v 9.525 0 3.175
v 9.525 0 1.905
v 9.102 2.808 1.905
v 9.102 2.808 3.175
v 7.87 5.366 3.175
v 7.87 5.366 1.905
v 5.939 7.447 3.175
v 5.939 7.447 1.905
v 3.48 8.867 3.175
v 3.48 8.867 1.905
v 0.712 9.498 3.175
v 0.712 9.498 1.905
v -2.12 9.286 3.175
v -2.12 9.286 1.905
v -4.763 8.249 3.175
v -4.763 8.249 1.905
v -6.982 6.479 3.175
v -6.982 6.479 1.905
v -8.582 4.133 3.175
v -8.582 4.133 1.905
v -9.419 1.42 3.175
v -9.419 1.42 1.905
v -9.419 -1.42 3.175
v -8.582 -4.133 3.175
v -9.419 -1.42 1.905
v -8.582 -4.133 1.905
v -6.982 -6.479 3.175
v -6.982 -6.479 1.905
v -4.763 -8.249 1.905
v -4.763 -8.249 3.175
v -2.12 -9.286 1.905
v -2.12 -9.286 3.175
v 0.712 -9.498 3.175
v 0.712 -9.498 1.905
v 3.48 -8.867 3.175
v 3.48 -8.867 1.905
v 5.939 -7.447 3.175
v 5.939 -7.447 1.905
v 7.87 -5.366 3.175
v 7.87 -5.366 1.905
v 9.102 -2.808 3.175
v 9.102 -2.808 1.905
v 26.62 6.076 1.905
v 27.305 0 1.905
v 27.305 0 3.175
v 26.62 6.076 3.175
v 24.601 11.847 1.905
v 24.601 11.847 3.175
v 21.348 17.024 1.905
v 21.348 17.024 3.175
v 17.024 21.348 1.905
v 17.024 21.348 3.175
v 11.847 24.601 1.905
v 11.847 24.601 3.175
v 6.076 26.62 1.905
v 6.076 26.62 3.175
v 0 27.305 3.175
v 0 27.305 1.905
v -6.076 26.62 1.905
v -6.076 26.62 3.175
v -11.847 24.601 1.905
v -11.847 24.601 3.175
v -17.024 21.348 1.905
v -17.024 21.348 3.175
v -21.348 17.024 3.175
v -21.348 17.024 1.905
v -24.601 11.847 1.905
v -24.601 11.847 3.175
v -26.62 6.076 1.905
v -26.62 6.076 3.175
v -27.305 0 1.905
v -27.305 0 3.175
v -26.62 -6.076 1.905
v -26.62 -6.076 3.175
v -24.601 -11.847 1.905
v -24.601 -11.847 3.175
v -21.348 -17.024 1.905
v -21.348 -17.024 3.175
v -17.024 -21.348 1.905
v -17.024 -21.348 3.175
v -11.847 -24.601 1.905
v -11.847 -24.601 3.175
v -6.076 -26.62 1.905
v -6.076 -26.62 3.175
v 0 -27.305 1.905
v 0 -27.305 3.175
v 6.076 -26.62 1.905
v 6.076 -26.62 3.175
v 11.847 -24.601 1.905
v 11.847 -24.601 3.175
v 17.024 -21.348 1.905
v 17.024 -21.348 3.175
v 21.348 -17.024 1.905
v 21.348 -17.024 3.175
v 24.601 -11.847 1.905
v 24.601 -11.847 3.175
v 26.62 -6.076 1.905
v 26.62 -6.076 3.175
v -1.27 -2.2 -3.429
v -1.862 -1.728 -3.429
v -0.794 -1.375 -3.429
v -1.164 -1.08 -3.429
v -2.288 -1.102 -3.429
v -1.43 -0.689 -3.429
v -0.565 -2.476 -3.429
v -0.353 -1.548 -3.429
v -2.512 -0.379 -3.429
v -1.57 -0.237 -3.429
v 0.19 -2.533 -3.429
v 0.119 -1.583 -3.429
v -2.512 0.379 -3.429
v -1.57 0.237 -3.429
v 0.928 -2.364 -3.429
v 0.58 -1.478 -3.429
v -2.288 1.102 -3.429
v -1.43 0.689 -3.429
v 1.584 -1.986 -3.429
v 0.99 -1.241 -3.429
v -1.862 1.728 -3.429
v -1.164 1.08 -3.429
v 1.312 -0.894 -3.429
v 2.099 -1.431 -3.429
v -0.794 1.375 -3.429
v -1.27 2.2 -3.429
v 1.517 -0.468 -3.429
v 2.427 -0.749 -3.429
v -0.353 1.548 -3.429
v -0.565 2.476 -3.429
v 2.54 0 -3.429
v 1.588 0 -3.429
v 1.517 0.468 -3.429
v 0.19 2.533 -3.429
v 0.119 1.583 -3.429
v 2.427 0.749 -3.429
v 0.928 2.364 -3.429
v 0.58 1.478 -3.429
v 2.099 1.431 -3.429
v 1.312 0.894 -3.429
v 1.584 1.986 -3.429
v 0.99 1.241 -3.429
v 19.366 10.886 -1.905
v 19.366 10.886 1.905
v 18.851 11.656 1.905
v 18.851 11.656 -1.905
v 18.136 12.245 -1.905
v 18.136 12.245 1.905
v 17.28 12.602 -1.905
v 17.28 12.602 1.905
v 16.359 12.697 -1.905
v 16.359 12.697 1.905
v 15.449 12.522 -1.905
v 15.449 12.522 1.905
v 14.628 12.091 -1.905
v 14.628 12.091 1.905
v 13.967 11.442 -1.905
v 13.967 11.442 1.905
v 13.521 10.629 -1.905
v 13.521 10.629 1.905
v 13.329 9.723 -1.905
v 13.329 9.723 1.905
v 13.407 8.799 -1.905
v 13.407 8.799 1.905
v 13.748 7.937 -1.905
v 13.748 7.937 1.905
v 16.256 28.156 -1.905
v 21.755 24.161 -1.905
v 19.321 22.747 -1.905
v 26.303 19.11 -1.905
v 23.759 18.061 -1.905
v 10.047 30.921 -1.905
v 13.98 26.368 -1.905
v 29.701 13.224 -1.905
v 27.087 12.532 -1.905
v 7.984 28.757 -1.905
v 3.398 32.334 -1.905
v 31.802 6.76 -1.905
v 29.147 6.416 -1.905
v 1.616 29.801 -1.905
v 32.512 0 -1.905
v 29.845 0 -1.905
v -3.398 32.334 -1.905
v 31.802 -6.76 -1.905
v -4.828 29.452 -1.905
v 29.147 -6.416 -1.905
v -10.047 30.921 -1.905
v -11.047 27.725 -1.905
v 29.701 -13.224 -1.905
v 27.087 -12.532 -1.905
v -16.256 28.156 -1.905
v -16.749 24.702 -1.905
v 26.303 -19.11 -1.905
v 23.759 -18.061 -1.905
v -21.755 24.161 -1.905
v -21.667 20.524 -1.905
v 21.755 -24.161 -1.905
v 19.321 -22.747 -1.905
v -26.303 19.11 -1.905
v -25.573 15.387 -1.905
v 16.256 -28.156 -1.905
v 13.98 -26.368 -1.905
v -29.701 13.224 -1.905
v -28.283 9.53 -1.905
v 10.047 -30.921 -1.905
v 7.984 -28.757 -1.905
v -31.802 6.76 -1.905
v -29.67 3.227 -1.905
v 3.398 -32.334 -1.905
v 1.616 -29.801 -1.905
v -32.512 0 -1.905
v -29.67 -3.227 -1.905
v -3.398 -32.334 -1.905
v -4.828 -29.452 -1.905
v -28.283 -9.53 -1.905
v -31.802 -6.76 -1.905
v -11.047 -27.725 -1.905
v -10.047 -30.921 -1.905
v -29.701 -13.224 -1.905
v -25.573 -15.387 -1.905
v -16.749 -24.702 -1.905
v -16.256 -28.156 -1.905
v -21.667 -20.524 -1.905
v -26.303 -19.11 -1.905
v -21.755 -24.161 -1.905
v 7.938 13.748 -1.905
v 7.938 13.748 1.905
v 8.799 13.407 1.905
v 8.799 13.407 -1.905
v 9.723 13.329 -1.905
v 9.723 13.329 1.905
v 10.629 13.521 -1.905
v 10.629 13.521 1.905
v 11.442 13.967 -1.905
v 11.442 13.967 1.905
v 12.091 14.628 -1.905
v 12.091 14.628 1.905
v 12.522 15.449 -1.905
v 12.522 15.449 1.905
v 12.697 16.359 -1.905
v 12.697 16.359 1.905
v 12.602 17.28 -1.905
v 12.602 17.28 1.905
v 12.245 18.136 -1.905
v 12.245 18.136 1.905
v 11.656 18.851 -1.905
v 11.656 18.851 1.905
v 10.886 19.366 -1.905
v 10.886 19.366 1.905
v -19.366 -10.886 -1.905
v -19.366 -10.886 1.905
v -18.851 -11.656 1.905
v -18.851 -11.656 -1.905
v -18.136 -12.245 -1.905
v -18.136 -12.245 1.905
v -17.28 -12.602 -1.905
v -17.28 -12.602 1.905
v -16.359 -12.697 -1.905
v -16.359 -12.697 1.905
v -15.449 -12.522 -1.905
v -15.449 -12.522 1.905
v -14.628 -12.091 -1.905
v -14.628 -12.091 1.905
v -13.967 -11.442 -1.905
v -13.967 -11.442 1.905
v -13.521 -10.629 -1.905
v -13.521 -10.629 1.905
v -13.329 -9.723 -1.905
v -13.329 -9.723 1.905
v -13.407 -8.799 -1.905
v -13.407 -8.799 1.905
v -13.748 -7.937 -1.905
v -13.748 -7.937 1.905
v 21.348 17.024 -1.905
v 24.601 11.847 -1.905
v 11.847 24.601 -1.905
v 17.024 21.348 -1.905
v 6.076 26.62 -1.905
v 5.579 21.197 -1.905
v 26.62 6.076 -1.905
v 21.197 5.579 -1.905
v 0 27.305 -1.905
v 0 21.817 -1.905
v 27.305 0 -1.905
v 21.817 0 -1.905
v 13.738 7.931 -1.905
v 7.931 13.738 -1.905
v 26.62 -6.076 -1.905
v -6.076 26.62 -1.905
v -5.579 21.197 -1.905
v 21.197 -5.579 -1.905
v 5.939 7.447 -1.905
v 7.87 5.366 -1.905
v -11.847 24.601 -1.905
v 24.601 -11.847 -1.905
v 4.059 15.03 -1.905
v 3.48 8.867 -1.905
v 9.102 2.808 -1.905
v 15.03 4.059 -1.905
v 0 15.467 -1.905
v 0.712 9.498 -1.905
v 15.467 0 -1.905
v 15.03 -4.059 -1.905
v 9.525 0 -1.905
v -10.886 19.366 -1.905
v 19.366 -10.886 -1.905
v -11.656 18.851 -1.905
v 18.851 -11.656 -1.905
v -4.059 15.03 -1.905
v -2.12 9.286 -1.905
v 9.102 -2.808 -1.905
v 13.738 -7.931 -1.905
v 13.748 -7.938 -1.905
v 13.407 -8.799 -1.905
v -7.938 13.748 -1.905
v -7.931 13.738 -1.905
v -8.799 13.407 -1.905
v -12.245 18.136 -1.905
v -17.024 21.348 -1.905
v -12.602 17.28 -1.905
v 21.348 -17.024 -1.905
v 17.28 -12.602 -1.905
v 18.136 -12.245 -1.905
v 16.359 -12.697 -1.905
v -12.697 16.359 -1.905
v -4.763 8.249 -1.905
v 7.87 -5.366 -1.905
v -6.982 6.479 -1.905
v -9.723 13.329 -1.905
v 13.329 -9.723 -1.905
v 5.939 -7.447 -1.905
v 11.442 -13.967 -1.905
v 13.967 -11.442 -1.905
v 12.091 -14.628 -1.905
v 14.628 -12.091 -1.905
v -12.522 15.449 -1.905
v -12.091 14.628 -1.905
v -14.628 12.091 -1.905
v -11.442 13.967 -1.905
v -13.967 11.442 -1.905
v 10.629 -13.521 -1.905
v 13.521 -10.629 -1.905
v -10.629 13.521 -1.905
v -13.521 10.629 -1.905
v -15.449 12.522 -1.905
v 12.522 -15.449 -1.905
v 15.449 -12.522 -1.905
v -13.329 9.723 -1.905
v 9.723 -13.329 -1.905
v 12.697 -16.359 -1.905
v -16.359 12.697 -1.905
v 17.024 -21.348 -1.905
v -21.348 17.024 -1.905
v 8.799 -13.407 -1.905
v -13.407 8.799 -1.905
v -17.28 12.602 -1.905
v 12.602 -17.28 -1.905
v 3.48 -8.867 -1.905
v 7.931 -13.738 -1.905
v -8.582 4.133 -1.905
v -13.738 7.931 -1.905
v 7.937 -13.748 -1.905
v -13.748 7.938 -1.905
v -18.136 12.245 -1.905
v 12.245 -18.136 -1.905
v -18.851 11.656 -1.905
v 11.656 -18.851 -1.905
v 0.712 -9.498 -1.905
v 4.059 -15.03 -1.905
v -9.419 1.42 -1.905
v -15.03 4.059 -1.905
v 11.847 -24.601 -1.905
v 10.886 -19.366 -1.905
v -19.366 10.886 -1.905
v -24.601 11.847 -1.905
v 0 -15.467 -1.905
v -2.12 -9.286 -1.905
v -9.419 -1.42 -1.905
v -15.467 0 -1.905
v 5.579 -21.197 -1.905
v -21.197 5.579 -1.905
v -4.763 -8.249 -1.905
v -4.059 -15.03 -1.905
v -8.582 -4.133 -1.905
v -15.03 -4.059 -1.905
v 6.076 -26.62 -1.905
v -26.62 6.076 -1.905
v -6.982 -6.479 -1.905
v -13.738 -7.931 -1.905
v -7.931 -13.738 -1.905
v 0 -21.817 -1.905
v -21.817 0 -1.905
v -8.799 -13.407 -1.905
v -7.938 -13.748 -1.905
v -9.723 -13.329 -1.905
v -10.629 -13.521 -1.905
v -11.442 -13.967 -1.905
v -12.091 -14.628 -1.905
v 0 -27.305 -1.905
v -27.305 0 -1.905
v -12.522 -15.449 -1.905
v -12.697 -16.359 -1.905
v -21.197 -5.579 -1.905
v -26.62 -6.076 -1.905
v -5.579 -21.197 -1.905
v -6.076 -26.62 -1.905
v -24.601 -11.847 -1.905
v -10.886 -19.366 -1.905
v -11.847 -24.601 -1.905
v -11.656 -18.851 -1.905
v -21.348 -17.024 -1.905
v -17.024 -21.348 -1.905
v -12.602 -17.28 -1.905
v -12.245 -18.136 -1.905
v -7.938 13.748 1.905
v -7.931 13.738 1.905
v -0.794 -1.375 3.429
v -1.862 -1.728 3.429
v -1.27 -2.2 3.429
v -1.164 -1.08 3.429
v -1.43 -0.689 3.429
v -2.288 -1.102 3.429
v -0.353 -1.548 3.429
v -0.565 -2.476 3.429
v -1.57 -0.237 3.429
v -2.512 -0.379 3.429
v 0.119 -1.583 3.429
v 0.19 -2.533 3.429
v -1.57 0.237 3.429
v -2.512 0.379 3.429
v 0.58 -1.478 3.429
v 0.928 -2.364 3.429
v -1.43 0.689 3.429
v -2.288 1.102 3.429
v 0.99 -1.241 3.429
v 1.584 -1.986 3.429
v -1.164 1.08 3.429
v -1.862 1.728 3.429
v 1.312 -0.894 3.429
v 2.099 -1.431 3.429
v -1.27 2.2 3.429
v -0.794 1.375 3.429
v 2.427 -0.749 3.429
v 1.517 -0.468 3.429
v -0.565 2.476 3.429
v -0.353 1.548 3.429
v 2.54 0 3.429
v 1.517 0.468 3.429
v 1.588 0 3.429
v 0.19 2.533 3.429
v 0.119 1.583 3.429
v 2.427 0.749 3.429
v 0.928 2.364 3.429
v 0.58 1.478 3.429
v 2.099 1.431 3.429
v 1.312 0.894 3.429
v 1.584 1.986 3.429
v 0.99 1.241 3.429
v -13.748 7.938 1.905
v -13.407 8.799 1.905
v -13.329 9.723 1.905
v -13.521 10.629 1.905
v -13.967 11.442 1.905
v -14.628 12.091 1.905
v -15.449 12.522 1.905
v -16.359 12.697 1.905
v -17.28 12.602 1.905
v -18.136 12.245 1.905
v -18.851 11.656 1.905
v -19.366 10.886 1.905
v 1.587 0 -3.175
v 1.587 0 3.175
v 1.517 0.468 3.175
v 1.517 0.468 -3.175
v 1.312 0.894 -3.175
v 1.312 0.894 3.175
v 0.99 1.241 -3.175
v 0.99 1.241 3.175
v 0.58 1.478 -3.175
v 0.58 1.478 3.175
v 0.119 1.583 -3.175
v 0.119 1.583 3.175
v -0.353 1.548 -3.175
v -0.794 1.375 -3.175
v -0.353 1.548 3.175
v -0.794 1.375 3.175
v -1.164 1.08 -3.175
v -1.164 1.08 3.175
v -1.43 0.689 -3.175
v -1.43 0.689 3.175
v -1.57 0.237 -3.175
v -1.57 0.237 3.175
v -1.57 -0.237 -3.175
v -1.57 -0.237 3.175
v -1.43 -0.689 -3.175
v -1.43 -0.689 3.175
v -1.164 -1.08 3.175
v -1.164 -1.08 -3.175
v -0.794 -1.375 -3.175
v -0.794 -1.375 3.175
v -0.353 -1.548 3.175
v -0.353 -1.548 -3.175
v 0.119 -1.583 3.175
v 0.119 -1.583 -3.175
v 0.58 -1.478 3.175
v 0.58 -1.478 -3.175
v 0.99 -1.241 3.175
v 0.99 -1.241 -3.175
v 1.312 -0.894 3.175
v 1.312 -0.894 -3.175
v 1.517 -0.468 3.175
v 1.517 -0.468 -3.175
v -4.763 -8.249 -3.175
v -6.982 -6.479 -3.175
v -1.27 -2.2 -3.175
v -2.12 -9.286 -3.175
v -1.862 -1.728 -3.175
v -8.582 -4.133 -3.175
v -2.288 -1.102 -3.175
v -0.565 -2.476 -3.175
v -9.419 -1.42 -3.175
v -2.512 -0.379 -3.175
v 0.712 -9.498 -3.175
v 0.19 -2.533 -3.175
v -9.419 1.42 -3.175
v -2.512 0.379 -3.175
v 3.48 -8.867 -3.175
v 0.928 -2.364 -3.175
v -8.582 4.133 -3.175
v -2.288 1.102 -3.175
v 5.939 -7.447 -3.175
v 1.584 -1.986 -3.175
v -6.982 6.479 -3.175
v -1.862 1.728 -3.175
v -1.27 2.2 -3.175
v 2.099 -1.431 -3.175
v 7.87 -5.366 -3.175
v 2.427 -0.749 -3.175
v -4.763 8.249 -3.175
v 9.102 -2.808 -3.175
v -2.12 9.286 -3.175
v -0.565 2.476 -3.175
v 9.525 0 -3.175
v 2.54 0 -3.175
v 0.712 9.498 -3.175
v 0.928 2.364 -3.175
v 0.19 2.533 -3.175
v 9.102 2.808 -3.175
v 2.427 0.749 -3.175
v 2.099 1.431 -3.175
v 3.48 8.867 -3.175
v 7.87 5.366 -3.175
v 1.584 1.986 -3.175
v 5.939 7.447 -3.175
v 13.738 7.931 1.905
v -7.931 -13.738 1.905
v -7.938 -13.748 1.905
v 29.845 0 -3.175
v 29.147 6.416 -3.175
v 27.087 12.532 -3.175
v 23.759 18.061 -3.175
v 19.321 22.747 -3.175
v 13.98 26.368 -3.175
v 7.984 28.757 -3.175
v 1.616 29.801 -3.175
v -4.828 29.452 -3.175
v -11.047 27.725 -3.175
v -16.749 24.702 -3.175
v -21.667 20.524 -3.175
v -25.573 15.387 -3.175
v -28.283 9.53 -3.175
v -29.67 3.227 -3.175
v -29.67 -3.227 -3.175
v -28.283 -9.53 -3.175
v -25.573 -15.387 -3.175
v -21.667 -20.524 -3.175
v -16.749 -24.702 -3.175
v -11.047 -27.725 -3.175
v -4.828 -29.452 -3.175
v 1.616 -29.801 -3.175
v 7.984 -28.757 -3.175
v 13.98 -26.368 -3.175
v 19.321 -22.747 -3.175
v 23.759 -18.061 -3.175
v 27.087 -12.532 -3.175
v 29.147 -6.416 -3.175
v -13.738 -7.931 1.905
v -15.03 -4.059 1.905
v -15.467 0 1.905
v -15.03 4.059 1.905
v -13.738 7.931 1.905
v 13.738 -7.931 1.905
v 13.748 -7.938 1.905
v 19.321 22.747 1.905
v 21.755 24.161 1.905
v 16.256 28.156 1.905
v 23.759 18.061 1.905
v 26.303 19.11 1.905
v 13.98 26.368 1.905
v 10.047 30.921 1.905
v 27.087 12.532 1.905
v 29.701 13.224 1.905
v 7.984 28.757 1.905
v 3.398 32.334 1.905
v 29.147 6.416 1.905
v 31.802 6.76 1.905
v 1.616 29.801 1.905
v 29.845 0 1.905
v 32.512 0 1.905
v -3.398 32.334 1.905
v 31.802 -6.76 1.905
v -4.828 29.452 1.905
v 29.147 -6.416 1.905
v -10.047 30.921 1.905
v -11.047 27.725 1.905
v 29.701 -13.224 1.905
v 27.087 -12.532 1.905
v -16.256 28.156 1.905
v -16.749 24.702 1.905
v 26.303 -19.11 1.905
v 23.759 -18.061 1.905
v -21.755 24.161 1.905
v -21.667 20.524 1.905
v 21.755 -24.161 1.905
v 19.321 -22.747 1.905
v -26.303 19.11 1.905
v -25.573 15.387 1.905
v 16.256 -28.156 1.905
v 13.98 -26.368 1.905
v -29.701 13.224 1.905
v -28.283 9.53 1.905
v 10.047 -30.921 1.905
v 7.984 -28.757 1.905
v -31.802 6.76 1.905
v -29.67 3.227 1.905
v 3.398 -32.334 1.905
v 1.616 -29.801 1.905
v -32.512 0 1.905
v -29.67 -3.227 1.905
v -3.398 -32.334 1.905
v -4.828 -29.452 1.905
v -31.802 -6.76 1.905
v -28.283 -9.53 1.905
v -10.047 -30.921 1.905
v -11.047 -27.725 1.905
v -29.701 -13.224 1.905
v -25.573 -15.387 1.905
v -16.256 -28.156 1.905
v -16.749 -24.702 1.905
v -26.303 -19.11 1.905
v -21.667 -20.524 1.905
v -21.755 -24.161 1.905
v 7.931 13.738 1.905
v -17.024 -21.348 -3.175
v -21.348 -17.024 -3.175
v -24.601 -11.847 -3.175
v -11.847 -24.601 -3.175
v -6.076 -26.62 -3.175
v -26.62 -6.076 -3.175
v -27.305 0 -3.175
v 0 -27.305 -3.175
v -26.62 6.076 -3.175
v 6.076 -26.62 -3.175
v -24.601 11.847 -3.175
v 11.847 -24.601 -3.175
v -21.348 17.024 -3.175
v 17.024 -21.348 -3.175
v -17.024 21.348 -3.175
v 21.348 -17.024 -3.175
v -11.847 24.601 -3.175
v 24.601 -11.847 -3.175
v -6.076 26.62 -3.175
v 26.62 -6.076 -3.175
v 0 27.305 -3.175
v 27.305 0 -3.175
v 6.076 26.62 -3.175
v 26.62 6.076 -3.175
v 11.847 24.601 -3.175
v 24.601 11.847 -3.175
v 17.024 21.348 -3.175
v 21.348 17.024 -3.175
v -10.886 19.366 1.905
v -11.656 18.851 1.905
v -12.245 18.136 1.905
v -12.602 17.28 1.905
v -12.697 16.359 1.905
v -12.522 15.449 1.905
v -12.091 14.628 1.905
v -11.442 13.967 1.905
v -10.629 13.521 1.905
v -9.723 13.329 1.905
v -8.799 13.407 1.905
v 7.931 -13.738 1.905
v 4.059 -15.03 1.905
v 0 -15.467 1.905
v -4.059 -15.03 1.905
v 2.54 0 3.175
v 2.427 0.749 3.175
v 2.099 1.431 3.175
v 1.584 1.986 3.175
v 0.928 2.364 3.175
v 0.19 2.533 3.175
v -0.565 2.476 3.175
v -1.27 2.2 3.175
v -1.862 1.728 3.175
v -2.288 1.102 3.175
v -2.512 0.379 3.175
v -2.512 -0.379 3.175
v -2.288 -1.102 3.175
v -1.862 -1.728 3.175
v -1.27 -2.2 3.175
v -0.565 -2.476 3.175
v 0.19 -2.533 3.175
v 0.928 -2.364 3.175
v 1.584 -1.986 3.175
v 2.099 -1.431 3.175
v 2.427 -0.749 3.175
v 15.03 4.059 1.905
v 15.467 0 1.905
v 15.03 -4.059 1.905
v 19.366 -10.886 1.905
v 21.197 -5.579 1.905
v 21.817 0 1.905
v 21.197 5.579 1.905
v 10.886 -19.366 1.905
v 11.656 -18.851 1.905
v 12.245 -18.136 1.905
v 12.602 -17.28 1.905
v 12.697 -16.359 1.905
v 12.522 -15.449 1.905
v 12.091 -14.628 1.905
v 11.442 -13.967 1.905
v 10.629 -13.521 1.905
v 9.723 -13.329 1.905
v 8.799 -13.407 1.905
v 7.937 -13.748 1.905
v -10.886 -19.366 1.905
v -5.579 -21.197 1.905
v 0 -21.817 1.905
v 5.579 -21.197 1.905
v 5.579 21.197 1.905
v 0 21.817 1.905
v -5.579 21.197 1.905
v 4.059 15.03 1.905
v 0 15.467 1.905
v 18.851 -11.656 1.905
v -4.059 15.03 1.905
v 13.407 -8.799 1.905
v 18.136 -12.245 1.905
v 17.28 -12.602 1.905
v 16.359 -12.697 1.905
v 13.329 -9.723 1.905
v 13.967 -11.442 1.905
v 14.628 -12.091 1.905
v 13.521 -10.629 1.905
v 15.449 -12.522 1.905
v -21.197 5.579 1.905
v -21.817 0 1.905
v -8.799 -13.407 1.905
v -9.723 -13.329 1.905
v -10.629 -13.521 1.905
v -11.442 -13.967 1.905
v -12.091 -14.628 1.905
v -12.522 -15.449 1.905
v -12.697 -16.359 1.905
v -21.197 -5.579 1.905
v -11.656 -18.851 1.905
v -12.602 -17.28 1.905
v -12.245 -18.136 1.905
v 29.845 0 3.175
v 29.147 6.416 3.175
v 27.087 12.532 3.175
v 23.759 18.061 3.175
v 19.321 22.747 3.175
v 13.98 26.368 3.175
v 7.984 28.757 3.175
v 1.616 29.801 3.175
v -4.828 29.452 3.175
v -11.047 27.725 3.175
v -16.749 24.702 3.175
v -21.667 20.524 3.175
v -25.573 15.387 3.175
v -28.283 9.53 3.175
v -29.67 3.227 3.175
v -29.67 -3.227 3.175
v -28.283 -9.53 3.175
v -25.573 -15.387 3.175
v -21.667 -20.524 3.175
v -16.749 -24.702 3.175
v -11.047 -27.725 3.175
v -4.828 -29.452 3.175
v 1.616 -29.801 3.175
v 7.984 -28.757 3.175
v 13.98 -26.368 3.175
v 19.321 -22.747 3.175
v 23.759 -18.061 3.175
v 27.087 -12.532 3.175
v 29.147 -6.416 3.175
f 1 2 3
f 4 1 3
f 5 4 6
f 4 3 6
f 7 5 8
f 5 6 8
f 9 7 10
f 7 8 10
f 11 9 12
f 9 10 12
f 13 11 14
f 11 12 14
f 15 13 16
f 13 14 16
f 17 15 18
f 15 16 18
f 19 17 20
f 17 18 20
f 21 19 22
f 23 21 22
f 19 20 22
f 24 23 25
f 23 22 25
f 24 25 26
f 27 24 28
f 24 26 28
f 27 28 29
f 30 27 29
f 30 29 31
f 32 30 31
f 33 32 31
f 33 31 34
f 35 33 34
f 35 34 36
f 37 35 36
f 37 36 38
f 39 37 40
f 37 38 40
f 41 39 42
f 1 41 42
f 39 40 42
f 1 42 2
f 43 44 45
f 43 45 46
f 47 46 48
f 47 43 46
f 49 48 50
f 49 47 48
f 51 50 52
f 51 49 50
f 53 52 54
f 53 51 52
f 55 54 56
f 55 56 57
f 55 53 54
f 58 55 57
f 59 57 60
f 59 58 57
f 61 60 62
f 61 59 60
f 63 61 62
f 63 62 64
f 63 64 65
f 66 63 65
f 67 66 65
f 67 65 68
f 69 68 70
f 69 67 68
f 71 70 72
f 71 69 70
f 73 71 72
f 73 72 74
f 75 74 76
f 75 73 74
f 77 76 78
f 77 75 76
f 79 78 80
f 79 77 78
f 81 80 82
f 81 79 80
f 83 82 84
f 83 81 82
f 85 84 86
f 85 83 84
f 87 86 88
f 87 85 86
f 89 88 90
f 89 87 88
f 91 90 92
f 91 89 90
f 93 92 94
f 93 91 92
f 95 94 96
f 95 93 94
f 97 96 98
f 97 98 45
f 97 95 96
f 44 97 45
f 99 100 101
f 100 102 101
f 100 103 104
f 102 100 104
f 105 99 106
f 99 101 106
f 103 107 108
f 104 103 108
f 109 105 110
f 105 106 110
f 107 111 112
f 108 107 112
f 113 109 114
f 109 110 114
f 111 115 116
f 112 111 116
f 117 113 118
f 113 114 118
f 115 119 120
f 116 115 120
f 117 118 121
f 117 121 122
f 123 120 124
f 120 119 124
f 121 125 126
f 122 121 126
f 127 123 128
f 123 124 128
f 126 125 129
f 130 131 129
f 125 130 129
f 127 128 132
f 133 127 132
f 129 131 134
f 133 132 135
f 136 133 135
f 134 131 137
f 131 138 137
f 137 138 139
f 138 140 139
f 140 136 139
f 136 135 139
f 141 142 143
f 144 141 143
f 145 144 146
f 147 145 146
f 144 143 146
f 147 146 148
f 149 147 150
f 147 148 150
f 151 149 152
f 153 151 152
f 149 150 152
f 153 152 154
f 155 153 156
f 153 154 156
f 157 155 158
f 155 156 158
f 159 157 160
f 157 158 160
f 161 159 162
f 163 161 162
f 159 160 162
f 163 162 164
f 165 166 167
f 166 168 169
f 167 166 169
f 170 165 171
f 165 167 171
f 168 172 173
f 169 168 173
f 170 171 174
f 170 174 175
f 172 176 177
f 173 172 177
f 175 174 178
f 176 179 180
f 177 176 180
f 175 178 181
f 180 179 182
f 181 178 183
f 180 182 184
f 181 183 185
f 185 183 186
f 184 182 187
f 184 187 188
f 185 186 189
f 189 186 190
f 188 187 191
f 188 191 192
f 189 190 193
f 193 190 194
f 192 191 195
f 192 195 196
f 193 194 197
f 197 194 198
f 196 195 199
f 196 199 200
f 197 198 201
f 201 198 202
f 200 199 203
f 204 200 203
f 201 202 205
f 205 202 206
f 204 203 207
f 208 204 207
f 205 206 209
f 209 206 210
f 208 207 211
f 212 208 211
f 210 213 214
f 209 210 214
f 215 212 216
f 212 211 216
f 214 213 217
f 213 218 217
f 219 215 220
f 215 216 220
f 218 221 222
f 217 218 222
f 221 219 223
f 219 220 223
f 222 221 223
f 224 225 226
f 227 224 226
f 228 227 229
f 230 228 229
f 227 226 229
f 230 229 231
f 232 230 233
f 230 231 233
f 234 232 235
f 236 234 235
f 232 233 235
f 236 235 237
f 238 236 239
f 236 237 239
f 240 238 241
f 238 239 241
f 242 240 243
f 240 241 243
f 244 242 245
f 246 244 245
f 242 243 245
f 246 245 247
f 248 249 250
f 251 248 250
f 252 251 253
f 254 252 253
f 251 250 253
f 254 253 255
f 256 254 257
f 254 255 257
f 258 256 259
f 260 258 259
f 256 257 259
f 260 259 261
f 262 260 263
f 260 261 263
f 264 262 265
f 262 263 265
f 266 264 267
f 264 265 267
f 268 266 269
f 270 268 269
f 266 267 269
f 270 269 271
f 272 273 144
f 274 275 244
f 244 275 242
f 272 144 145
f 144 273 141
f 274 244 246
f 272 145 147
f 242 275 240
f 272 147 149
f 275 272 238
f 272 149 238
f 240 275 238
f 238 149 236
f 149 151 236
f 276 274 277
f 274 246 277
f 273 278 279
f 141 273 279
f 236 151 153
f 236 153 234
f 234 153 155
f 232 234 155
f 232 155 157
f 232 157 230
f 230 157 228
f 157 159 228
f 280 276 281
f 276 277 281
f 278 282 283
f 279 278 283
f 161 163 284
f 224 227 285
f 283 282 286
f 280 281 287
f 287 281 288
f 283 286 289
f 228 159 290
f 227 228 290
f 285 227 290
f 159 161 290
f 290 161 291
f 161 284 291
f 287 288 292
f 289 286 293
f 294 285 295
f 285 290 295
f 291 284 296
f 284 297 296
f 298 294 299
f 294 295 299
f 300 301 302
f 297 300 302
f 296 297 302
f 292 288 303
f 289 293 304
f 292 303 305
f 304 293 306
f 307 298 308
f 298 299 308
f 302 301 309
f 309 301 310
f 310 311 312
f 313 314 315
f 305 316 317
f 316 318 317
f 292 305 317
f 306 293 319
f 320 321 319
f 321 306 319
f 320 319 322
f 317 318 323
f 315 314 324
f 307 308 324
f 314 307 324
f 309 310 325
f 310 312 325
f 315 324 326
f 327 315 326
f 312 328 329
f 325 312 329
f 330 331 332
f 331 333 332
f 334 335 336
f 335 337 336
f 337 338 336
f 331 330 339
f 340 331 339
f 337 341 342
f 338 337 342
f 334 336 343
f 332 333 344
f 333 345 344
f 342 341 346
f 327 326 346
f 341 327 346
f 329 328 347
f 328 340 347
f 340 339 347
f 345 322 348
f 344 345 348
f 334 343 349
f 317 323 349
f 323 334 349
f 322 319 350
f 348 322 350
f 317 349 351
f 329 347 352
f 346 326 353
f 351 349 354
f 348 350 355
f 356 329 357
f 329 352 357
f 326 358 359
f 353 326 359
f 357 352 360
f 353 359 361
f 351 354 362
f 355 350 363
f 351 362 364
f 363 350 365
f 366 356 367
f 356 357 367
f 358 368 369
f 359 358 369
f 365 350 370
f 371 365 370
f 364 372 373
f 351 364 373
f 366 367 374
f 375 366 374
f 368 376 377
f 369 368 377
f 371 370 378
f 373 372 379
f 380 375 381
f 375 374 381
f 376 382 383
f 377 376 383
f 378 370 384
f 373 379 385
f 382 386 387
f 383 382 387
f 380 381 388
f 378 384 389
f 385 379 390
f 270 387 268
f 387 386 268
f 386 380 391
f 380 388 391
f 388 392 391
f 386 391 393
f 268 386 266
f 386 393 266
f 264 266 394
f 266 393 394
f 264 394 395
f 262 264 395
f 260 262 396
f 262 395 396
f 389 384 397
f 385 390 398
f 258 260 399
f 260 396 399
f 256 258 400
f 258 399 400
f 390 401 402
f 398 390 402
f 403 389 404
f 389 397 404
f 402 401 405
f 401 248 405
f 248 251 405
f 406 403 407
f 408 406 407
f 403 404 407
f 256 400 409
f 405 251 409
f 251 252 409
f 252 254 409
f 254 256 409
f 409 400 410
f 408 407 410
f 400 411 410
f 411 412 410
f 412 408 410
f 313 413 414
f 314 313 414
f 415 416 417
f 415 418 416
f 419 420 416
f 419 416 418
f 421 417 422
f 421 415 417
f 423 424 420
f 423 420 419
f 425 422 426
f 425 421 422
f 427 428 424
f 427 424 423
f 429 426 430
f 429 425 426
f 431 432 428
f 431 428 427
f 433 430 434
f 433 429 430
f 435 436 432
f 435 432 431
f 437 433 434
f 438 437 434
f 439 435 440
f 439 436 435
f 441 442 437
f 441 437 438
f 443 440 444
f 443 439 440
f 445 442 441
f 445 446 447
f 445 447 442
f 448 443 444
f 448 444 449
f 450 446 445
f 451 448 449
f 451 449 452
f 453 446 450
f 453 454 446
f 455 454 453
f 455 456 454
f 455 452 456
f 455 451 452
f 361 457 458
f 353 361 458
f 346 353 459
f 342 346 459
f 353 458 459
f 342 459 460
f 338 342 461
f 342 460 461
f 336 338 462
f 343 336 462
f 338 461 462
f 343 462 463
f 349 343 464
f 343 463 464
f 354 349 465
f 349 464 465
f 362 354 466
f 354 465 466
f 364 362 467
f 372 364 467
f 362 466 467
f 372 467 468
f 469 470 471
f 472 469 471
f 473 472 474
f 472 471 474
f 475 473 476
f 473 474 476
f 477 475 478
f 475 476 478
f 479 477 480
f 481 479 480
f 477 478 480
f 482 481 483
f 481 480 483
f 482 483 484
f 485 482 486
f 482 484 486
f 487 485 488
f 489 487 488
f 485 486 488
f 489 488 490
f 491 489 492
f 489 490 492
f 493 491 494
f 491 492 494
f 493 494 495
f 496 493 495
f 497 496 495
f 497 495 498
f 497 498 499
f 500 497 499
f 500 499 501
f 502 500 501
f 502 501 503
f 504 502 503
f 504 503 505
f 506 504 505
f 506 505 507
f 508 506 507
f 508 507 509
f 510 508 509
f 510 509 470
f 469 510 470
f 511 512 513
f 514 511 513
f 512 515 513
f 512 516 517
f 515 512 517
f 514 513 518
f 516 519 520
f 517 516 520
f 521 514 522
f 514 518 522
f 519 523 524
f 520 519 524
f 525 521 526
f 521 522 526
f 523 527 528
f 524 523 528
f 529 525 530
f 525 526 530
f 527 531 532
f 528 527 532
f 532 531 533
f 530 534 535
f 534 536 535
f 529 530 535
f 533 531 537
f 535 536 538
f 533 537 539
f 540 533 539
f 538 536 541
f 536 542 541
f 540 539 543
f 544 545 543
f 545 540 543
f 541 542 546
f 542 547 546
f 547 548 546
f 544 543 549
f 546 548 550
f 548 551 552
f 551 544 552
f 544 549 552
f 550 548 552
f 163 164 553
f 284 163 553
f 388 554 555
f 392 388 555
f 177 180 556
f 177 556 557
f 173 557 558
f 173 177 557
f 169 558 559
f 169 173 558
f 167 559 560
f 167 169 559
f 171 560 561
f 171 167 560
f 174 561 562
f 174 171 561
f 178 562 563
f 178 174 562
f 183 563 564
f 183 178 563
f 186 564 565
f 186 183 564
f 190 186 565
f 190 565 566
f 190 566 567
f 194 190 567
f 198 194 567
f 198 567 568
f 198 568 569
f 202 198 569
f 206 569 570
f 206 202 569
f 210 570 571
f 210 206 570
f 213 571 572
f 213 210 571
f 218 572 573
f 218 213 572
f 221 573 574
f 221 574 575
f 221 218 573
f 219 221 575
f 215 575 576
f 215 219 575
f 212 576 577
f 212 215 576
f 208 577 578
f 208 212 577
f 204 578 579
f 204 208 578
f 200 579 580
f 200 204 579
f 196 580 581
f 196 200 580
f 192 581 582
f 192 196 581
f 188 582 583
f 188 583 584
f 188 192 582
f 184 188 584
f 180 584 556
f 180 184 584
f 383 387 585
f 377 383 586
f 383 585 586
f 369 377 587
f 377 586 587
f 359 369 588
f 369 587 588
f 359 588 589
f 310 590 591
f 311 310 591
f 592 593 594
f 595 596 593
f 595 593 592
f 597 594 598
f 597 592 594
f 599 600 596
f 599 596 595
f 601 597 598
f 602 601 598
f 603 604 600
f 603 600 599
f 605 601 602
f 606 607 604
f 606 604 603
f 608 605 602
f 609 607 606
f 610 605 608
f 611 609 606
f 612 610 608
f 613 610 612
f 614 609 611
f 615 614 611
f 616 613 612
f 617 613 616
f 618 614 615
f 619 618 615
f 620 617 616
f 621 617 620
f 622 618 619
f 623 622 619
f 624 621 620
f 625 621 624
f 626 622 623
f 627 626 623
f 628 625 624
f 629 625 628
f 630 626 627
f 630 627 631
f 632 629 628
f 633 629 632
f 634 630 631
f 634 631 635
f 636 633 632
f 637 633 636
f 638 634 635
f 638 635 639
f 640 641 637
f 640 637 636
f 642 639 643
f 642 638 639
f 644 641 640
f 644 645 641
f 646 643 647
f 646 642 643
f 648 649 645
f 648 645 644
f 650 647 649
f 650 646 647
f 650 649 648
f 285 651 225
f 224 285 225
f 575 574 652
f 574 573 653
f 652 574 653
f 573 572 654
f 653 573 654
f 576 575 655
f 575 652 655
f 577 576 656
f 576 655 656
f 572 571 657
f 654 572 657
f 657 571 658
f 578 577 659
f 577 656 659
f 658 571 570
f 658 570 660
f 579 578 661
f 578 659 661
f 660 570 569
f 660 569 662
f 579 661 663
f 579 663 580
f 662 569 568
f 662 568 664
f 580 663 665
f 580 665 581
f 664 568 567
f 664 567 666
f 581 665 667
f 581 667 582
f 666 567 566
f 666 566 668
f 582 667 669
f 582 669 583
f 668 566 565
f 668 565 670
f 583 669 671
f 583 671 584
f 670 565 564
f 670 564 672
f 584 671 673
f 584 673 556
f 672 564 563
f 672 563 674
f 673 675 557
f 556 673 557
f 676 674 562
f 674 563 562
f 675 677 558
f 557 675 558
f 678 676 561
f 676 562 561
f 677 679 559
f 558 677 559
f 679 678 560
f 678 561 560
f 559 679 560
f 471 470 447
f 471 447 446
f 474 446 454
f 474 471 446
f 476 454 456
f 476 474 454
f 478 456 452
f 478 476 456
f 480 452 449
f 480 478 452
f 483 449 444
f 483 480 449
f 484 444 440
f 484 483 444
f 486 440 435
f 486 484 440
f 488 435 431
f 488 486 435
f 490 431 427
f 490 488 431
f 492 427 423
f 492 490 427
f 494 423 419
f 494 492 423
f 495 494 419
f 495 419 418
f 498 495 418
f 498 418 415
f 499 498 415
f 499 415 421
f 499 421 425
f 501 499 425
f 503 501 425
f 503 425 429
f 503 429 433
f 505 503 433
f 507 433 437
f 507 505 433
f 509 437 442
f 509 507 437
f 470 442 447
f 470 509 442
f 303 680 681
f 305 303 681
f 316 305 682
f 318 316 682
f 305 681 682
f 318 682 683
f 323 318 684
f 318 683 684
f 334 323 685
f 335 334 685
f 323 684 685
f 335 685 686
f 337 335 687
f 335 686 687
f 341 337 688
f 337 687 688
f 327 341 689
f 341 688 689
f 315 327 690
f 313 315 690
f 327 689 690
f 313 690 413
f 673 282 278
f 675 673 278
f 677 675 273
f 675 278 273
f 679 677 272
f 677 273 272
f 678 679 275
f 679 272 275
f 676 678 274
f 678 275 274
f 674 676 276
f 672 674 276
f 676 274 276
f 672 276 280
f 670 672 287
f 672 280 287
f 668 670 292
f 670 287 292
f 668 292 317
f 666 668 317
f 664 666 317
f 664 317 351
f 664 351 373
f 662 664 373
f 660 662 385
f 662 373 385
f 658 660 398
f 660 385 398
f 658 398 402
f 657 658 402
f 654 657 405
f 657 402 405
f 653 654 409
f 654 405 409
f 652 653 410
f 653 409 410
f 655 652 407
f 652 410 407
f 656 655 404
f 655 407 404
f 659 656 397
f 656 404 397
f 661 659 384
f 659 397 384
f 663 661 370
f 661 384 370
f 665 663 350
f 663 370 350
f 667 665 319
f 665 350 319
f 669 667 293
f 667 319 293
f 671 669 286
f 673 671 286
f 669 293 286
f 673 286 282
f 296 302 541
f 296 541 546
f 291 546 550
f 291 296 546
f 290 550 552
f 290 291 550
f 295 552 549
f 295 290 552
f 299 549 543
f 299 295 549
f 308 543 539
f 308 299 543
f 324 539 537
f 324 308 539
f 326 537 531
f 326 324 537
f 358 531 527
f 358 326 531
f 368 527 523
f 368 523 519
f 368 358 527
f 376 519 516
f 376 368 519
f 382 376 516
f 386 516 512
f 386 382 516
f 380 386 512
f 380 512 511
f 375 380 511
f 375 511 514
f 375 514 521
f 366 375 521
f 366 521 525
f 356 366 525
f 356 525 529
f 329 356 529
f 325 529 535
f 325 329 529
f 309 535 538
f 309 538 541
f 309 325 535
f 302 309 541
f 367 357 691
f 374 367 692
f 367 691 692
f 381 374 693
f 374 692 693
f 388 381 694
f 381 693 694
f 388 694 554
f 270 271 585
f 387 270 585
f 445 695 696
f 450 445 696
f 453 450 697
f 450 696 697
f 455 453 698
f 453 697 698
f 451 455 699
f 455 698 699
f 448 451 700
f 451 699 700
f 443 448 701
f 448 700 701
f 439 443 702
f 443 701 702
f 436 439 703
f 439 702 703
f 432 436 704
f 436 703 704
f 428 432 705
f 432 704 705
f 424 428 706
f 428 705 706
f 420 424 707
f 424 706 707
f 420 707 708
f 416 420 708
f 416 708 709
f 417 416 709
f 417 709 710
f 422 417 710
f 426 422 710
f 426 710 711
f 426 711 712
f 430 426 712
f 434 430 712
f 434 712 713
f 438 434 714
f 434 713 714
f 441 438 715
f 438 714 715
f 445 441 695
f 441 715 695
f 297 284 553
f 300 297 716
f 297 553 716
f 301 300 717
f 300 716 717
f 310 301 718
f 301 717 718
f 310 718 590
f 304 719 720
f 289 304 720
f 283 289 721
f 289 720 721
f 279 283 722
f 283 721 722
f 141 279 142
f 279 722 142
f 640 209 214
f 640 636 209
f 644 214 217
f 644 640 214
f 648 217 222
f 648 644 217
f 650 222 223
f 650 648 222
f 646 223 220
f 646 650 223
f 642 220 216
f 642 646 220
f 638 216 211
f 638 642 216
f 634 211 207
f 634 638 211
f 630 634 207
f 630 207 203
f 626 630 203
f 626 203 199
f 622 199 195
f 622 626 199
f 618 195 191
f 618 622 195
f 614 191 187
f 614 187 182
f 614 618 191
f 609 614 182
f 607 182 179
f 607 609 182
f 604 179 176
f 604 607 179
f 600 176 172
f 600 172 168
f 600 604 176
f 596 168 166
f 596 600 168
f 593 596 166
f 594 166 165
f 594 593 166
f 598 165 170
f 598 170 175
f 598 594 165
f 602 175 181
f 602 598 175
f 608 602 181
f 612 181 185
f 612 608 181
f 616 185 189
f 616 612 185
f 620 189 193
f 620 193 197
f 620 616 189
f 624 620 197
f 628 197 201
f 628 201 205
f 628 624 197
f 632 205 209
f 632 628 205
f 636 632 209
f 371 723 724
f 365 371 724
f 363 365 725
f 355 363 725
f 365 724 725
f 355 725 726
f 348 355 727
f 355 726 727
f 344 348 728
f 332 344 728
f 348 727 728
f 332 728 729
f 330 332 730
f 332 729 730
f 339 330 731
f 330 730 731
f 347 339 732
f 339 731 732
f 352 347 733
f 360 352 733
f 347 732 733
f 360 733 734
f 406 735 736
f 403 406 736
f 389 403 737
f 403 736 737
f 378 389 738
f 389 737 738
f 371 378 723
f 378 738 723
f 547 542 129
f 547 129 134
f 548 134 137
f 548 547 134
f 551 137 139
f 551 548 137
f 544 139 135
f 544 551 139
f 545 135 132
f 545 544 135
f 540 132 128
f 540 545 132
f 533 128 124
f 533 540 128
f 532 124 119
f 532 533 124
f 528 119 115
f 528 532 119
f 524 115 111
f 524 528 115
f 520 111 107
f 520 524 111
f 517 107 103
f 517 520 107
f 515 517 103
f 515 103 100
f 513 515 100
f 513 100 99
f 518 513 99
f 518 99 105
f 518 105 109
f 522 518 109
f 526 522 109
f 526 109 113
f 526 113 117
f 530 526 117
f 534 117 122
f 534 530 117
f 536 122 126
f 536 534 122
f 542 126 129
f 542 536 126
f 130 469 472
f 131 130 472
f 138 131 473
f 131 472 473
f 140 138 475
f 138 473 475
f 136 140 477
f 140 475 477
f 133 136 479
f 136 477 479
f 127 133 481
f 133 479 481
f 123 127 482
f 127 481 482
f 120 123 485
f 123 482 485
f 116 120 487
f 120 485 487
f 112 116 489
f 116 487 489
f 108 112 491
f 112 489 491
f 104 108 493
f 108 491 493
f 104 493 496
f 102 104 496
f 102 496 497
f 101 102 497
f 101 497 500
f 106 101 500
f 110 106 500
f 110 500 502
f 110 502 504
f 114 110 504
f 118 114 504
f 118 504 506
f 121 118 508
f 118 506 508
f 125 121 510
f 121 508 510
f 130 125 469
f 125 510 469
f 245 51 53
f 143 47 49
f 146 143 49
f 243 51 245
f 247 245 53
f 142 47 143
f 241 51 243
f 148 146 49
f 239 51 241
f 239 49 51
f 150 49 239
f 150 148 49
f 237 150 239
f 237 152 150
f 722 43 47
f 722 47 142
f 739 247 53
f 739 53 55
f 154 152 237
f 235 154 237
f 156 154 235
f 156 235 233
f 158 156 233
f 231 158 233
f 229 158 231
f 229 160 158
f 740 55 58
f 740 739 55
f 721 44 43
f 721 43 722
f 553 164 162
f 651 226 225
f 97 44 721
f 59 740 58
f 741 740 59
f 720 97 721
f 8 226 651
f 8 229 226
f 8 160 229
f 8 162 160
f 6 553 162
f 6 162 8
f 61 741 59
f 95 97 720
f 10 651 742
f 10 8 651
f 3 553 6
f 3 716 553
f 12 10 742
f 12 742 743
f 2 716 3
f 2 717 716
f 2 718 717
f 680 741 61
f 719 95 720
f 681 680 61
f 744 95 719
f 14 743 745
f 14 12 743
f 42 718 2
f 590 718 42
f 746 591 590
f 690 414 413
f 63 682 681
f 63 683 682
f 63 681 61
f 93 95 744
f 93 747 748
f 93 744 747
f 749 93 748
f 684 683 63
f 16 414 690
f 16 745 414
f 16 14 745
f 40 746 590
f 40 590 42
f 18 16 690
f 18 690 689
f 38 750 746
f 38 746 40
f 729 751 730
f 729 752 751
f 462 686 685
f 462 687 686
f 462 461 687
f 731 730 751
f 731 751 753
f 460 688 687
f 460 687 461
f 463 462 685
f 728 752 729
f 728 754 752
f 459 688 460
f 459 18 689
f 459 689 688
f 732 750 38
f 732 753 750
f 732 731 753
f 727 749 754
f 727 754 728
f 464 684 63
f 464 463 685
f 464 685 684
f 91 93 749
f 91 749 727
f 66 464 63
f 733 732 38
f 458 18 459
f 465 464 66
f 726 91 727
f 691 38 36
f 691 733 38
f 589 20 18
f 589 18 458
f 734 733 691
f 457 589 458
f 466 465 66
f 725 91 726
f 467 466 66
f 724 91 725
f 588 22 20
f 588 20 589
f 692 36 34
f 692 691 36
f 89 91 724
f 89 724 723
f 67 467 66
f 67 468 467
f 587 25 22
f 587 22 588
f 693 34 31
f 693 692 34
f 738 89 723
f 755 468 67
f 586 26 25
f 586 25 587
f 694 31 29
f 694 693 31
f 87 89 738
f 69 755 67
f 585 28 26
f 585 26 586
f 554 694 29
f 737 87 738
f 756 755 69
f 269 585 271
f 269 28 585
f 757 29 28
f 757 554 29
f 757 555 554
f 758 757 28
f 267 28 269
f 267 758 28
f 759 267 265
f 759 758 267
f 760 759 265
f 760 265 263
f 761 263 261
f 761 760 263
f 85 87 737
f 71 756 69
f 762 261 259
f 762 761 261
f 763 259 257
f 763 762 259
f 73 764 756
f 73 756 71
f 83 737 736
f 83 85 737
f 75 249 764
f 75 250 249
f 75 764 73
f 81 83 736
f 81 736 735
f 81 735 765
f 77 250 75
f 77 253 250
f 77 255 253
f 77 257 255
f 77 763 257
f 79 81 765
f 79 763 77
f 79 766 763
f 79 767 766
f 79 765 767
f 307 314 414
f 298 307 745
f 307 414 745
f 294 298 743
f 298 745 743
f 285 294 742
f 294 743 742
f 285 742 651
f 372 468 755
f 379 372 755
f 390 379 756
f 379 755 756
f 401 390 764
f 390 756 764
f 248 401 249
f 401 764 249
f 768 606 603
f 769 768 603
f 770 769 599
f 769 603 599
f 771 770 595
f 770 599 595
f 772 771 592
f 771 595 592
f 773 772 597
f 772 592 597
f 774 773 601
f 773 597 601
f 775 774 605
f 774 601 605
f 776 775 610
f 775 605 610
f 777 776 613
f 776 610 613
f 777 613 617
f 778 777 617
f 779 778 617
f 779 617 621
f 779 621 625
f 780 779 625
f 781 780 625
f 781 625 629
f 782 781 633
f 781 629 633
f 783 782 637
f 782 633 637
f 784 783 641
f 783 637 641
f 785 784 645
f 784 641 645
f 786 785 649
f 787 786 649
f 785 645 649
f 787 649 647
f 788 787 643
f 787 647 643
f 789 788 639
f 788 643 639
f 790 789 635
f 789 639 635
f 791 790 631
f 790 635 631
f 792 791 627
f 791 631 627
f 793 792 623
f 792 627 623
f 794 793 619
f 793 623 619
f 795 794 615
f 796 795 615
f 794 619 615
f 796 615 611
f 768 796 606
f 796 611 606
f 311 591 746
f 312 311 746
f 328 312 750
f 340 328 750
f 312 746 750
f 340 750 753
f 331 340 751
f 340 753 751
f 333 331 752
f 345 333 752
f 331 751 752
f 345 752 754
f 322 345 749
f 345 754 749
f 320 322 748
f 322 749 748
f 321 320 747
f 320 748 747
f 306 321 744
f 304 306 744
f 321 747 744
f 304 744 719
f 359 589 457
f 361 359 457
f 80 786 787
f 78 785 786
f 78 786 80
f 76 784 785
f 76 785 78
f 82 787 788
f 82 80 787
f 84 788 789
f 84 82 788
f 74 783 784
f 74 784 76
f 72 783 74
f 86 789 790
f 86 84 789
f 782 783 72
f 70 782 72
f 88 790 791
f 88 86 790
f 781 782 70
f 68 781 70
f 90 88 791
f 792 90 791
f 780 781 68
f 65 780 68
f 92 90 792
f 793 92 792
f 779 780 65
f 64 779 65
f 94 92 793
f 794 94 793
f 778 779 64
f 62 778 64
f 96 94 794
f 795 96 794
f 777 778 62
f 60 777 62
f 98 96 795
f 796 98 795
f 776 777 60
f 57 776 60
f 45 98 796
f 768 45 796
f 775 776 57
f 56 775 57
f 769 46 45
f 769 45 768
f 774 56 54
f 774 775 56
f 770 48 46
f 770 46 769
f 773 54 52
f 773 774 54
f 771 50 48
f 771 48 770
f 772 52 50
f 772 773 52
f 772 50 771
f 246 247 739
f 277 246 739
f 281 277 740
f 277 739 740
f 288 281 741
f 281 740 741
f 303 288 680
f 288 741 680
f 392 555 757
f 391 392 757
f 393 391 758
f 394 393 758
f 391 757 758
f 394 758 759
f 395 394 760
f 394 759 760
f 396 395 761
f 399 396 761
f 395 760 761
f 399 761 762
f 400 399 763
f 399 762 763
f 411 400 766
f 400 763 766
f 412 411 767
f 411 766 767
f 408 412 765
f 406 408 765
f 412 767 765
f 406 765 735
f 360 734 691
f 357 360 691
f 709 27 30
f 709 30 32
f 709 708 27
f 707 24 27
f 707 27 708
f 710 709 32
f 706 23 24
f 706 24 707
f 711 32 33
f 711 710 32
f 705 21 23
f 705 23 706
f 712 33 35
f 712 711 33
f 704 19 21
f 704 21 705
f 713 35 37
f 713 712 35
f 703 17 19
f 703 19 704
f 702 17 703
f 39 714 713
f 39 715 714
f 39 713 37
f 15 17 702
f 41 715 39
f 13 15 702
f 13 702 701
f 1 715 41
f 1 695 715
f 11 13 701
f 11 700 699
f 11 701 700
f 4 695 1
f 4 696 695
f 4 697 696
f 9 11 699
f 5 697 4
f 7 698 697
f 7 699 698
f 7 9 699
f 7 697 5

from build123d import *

# Parameters (mm, degrees)
SKETCH1_R           = 32.512
BOSS_EXTRUDE1_DEPTH = 1.905
SKETCH2_R           = 29.845
SKETCH2_R_2         = 27.305
BOSS_EXTRUDE2_DEPTH = 1.27
SKETCH3_R           = 9.525
BOSS_EXTRUDE3_DEPTH = 1.27
CUT_EXTRUDE1_REACH  = 48.136
CIRPATTERN1_COUNT   = 4
SKETCH5_R           = 2.54
SKETCH5_R_2         = 1.5875
BOSS_EXTRUDE4_DEPTH = 0.254
CUT_EXTRUDE2_REACH  = 48.451
SKETCH6_R           = 1.5875


with BuildPart() as part:
    # Sketch1 → Boss-Extrude1 (new, symmetric)
    with BuildSketch(Plane.XY):
        with Locations(Location((0, 0, 0), (0, 0, 180))):
            Circle(SKETCH1_R)
    extrude(amount=BOSS_EXTRUDE1_DEPTH, both=True)

    # Sketch2 → Boss-Extrude2 (add)
    with BuildSketch(Plane.XY.offset(1.905)):
        Circle(SKETCH2_R)
        Circle(SKETCH2_R_2, mode=Mode.SUBTRACT)
    boss_extrude2 = extrude(amount=BOSS_EXTRUDE2_DEPTH)

    # Sketch3 → Boss-Extrude3 (add)
    with BuildSketch(Plane.XY.offset(1.905)):
        Circle(SKETCH3_R)
    boss_extrude3 = extrude(amount=BOSS_EXTRUDE3_DEPTH)

    # Sketch4 → Cut-Extrude1 (cut, up to next)
    with BuildSketch(Plane.XY.offset(1.905), mode=Mode.PRIVATE) as cut_extrude1_sk1:
        with BuildLine():
            ThreePointArc((10.885714286, 19.366421534), (0, 21.8173208), (-10.885714286, 19.366421534))
            ThreePointArc((-10.885714286, 19.366421534), (-12.336421788, 15.022476336), (-7.9375, 13.748153285))
            Line((-7.9375, 13.748153285), (-7.931449378, 13.737673301))
            ThreePointArc((-7.931449378, 13.737673301), (0, 15.4673208), (7.931449378, 13.737673301))
            Line((7.931449378, 13.737673301), (7.9375, 13.748153285))
            ThreePointArc((7.9375, 13.748153285), (12.336421788, 15.022476336), (10.885714286, 19.366421534))
        make_face()
    cut_extrude1_tool1 = extrude(cut_extrude1_sk1.sketch, amount=-CUT_EXTRUDE1_REACH, mode=Mode.PRIVATE) & part.part
    cut_extrude1 = cut_extrude1_tool1.solids().sort_by_distance((0, 17.6348, 1.905))[0]
    add(cut_extrude1, mode=Mode.SUBTRACT)

    # CirPattern1: Cut-Extrude1 ×4 about axis
    cirpattern1_axis = Axis((0, 0, 0), (0, 0, 1))
    for i in range(1, CIRPATTERN1_COUNT):
        add(cut_extrude1.rotate(cirpattern1_axis, i * 360 / CIRPATTERN1_COUNT), mode=Mode.SUBTRACT)

    # Sketch5 → Boss-Extrude4 (add)
    with BuildSketch(Plane.XY.offset(3.175)):
        Circle(SKETCH5_R)
        Circle(SKETCH5_R_2, mode=Mode.SUBTRACT)
    boss_extrude4 = extrude(amount=BOSS_EXTRUDE4_DEPTH)

    # Mirror1: Boss-Extrude2, Boss-Extrude3, Boss-Extrude4 across plane
    add(boss_extrude2.mirror(Plane.XY))
    add(boss_extrude3.mirror(Plane.XY))
    add(boss_extrude4.mirror(Plane.XY))

    # Sketch6 → Cut-Extrude2 (cut, up to next)
    with BuildSketch(Plane.XY.offset(3.175), mode=Mode.PRIVATE) as cut_extrude2_sk1:
        Circle(SKETCH6_R)
    cut_extrude2_tool1 = extrude(cut_extrude2_sk1.sketch, amount=-CUT_EXTRUDE2_REACH, mode=Mode.PRIVATE) & part.part
    add(cut_extrude2_tool1.solids().sort_by_distance((0, 0, 3.175))[0], mode=Mode.SUBTRACT)


solid = part.part
